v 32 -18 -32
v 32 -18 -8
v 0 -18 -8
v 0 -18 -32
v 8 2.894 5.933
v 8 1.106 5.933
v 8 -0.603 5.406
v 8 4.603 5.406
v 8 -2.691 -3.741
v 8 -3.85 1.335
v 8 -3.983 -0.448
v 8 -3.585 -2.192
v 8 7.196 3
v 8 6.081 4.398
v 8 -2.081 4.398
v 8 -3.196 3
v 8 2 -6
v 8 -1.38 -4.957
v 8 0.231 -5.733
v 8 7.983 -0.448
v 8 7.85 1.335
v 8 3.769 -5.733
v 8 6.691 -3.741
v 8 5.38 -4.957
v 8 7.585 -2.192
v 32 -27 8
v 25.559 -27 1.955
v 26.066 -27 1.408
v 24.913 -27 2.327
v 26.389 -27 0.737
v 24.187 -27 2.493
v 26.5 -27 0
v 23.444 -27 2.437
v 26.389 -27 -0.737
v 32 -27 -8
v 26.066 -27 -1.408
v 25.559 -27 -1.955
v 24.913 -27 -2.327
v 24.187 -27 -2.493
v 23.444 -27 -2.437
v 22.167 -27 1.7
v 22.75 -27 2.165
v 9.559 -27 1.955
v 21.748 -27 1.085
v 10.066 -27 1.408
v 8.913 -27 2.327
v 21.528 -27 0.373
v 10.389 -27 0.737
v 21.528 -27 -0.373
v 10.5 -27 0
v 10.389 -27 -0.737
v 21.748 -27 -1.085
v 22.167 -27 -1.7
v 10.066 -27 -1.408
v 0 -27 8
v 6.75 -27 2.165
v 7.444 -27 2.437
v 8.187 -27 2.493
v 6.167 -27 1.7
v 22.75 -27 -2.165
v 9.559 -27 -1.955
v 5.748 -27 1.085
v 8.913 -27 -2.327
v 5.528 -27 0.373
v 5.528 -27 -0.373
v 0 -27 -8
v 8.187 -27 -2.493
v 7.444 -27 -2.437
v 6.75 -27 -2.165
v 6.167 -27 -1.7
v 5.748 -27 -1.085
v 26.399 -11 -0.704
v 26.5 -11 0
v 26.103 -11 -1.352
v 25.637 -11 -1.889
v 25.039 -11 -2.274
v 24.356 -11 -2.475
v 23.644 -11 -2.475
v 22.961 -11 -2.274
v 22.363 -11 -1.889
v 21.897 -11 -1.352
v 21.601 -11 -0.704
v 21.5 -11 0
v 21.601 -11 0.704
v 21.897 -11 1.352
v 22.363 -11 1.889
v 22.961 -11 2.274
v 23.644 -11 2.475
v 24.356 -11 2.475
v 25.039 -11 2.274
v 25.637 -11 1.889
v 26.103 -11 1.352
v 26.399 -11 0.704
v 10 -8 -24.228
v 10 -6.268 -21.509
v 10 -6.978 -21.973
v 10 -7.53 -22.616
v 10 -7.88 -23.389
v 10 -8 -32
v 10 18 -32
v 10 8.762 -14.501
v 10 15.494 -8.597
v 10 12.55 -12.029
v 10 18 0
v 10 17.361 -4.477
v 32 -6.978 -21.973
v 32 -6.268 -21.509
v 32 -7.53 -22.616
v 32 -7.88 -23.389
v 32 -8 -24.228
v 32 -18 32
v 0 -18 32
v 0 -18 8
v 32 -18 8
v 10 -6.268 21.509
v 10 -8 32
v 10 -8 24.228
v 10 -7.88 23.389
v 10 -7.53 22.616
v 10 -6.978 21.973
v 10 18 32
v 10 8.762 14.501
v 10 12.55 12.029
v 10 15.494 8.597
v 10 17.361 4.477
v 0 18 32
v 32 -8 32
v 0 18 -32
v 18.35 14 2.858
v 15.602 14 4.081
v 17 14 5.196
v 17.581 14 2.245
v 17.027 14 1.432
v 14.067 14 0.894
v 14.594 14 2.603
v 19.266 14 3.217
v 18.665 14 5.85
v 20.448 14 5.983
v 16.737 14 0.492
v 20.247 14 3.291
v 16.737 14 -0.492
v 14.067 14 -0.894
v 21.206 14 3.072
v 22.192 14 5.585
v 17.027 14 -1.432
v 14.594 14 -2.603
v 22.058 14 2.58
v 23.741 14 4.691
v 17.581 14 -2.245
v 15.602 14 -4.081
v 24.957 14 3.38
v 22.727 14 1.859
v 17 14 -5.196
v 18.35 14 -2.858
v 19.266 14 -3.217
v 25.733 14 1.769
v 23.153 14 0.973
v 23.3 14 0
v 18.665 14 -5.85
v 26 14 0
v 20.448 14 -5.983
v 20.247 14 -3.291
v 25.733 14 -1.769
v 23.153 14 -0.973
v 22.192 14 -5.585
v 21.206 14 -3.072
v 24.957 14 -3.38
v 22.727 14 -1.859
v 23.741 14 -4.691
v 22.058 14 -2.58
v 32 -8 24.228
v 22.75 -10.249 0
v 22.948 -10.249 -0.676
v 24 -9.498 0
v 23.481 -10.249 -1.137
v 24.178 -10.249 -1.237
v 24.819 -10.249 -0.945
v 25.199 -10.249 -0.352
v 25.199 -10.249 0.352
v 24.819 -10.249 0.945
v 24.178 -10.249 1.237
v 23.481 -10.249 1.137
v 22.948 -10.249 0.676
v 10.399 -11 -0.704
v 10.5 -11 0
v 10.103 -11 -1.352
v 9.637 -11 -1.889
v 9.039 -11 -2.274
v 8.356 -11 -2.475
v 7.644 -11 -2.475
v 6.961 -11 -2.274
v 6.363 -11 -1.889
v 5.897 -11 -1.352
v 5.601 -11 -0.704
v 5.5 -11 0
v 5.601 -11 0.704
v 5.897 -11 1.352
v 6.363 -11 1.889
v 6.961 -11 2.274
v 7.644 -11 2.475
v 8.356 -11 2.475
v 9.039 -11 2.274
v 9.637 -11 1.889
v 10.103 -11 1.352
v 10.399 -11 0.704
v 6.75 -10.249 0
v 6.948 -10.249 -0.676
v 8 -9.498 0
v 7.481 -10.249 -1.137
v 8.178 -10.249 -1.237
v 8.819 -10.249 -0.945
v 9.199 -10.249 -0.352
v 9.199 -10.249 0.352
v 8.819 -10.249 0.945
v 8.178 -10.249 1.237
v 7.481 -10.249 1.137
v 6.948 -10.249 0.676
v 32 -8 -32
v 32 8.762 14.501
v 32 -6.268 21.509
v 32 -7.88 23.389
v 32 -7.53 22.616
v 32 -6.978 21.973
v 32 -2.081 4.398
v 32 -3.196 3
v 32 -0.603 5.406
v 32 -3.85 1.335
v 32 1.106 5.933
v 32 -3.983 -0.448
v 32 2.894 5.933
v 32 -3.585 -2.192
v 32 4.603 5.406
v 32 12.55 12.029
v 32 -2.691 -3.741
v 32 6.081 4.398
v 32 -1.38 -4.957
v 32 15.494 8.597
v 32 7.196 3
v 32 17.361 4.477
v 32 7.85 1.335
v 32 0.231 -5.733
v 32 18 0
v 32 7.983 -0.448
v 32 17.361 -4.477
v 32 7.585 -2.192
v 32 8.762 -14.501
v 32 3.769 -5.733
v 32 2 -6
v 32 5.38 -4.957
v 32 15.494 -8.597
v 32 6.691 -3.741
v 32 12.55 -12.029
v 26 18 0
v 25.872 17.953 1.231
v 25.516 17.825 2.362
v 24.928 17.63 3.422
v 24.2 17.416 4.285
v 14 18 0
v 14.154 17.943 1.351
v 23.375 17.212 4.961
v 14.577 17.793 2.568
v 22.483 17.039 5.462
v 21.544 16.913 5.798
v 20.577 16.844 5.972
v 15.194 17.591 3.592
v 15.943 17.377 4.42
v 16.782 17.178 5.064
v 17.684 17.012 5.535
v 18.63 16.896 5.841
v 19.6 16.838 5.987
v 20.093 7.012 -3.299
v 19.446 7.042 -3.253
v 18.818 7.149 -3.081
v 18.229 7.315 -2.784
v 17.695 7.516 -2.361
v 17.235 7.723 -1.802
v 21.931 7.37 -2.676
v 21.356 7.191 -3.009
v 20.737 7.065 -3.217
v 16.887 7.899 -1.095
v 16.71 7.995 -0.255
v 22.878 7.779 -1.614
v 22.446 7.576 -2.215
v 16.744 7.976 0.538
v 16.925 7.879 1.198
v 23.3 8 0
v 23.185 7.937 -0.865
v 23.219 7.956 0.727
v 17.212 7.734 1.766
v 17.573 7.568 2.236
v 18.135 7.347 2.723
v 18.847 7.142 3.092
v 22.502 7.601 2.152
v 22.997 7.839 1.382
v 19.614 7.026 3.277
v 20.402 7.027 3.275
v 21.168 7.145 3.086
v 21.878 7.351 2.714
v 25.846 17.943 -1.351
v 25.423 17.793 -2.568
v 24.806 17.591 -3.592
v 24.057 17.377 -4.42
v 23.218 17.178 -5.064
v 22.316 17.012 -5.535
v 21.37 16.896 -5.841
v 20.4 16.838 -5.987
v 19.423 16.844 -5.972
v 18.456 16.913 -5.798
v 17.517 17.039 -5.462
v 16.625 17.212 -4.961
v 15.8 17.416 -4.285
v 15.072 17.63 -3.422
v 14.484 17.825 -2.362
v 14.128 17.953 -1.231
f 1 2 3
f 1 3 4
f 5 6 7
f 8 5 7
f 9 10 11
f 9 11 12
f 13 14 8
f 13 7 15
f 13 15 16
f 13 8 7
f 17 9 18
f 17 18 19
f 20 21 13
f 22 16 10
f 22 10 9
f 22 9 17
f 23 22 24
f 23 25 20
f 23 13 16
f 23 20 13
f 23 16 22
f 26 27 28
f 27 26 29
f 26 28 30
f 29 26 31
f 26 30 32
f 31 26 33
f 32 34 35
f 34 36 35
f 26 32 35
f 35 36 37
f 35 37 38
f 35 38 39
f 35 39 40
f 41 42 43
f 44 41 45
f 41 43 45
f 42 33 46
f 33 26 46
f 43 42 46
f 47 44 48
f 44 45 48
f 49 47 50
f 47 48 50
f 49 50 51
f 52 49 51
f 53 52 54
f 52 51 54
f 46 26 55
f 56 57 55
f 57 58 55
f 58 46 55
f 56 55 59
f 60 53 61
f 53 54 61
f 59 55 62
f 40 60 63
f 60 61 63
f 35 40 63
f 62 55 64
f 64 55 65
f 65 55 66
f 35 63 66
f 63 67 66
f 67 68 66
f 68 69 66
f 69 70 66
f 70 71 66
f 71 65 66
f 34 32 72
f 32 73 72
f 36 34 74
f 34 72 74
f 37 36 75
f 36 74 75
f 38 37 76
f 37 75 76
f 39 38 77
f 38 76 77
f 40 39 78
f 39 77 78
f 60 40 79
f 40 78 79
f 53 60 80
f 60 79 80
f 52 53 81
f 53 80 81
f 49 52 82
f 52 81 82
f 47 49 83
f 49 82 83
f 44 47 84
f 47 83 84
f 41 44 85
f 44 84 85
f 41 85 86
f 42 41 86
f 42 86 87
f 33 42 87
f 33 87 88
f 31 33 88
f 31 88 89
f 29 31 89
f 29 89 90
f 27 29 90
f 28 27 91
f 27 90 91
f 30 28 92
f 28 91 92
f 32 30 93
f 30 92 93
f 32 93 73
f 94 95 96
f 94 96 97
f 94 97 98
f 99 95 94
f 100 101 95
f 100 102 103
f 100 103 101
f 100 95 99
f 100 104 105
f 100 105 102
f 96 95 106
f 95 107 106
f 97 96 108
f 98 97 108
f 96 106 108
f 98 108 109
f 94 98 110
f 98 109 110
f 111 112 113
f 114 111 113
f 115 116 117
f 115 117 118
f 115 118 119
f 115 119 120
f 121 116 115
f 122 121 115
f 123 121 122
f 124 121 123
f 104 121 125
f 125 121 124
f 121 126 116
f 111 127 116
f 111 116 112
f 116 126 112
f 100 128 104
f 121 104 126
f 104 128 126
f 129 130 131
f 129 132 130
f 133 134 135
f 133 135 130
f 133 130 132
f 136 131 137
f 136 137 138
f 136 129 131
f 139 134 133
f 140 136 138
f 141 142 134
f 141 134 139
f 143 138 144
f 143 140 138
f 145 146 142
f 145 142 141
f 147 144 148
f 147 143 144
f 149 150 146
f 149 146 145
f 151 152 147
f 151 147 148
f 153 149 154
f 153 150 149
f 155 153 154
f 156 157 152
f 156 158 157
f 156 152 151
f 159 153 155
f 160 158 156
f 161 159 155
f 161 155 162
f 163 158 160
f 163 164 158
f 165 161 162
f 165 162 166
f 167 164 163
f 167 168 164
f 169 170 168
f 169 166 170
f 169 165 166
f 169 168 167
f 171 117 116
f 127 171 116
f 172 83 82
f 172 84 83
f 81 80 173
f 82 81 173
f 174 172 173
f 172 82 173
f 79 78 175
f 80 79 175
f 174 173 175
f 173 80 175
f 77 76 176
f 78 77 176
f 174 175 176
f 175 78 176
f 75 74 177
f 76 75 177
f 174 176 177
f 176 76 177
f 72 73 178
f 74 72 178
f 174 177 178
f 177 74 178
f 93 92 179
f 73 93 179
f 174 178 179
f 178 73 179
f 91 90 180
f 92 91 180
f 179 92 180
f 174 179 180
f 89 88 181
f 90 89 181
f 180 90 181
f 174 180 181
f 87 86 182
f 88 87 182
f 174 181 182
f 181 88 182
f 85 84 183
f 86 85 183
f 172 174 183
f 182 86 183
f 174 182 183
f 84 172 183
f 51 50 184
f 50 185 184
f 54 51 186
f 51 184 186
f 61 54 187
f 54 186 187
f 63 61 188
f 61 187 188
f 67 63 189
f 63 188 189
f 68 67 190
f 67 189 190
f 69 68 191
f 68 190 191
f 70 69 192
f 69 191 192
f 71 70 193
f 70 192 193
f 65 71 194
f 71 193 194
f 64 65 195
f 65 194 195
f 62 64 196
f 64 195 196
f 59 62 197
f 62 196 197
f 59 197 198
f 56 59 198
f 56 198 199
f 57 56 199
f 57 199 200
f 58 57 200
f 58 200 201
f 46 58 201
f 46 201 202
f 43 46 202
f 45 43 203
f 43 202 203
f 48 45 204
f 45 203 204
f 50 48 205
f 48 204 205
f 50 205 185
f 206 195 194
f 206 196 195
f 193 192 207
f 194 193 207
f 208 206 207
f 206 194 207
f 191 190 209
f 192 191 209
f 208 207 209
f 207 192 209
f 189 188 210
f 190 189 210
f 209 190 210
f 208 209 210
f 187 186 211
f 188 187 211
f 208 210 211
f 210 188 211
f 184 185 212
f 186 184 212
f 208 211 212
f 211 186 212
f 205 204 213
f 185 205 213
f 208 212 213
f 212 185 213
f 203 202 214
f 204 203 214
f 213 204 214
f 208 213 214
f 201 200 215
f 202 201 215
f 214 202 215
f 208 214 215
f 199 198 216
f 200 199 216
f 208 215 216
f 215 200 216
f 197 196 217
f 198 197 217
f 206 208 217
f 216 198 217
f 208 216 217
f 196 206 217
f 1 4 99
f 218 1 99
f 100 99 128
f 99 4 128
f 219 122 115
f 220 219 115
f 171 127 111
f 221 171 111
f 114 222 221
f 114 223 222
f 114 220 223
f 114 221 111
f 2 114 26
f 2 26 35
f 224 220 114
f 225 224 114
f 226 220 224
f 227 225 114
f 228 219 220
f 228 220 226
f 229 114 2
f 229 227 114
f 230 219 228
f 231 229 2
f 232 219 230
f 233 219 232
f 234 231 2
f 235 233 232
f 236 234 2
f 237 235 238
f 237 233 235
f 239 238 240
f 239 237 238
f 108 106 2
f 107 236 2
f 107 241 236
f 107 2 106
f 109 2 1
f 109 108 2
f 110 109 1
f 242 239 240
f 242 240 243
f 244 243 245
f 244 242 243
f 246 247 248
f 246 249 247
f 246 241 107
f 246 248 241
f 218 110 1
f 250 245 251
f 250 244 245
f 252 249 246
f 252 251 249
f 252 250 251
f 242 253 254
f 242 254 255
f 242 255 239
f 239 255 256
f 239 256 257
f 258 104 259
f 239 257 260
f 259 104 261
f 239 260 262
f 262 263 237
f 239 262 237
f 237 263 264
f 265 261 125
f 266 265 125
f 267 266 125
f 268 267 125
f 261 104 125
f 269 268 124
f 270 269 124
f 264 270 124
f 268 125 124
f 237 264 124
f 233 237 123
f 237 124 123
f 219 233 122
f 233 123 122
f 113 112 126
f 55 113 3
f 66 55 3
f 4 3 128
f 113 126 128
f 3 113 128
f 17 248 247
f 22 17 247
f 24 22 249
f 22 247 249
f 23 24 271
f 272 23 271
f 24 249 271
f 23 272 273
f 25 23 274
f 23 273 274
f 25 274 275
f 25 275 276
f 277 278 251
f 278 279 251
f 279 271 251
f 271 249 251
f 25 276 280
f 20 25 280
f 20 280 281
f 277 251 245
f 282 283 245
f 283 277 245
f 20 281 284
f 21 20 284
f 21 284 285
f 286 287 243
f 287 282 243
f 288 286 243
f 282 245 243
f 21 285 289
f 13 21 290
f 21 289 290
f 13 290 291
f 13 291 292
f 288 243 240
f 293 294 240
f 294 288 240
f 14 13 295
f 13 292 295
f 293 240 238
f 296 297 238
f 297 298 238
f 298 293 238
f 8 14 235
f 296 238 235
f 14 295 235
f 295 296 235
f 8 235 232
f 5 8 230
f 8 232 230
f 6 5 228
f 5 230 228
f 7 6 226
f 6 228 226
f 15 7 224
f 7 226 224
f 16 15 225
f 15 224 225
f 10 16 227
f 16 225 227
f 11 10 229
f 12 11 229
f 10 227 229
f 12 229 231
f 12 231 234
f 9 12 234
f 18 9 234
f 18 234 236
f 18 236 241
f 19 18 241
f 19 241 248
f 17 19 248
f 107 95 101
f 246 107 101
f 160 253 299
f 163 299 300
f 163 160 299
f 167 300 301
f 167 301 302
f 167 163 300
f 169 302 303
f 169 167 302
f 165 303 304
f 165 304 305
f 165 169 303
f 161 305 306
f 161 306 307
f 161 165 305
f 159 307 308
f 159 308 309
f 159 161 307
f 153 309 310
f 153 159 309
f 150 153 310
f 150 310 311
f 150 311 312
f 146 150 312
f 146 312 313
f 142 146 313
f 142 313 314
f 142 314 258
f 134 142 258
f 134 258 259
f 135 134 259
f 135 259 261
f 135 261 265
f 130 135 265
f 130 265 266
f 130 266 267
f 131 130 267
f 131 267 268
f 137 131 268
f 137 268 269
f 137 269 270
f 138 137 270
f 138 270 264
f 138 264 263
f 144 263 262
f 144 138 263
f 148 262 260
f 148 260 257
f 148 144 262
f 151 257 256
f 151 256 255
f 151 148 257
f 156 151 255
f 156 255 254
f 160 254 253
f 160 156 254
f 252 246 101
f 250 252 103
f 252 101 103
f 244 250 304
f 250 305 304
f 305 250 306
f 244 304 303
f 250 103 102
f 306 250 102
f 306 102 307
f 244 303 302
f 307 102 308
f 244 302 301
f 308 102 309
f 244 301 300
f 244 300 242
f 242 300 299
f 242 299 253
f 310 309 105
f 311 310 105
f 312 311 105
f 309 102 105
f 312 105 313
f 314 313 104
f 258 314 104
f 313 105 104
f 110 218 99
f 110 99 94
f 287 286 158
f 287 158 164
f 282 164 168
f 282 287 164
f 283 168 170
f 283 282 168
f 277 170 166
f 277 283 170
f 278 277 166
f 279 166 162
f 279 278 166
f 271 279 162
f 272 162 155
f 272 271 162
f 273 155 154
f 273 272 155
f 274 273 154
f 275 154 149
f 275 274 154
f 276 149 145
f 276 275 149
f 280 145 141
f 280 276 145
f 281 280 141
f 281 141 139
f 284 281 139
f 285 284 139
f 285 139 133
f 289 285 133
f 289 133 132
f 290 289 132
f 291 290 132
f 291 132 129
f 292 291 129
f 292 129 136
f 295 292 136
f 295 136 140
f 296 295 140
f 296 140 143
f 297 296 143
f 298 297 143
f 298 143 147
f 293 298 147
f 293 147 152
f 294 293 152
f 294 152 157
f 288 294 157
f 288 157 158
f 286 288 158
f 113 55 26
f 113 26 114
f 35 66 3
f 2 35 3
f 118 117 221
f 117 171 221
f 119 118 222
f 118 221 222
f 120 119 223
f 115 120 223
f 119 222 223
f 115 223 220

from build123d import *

# Parameters (mm, degrees)
SKETCH1_W                               = 16
SKETCH1_H                               = 9
SKETCH1_R                               = 6
BOSS_EXTRUDE1_DEPTH                     = 32
BOSS_EXTRUDE2_DEPTH                     = 10
CUT_EXTRUDE1_START                      = 32
SKETCH1_4_R                             = 6
CUT_EXTRUDE1_DEPTH                      = 24
FILLET1_R                               = 3
CBORE_START                             = 14
CBORE_FOR_M6_HEX_HEAD_BOLT1_OUTLINE_R   = 6
CBORE_FOR_M6_HEX_HEAD_BOLT1_DEPTH       = 4
CBORE_START_2                           = 7.010987826
CBORE_FOR_M6_HEX_HEAD_BOLT1_2_OUTLINE_R = 3.3
CBORE_FOR_M6_HEX_HEAD_BOLT1_2_DEPTH     = 6.989012174
M6X1_0_TAPPED_HOLE1_D                   = 5
M6X1_0_TAPPED_HOLE1_DEPTH               = 16
M6X1_0_TAPPED_HOLE1_TIP                 = 1.502151548


# Read off the part's stored shape, not the designer's step: CBORE for M6 Hex Head Bolt1
with BuildPart() as part:
    # Sketch1 → Boss-Extrude1 (new body)
    # profile 1 of 4: a face of its own
    with BuildSketch(Plane(origin=(0, 0, 0), x_dir=(0, 0, -1), z_dir=(1, 0, 0))):
        Polygon((-22.317123285, -8), (-32, -8), (-32, -18), (-8, -18), (8, -18), (32, -18), (32, -8), (22.317123285, -8), align=None)
    # profile 2 of 4: a face of its own
    with BuildSketch(Plane(origin=(0, 0, 0), x_dir=(0, 0, -1), z_dir=(1, 0, 0))):
        with Locations((0, -22.5)):
            Rectangle(SKETCH1_W, SKETCH1_H)
    # profile 3 of 4: a face of its own
    with BuildSketch(Plane(origin=(0, 0, 0), x_dir=(0, 0, -1), z_dir=(1, 0, 0))):
        with BuildLine():
            Line((-14.500924593, 8.761892188), (-22.317123285, -8))
            Line((-22.317123285, -8), (22.317123285, -8))
            Line((22.317123285, -8), (14.500924593, 8.761892188))
            ThreePointArc((14.500924593, 8.761892188), (8.596793684, 15.494263165), (-1.18e-07, 18))
            ThreePointArc((-1.18e-07, 18), (-8.596793783, 15.494263101), (-14.500924593, 8.761892188))
        make_face()
        with Locations((0, 2)):
            Circle(SKETCH1_R, mode=Mode.SUBTRACT)
    # profile 4 of 4: a face of its own
    with BuildSketch(Plane(origin=(0, 0, 0), x_dir=(0, 0, -1), z_dir=(1, 0, 0))):
        with Locations((0, 2)):
            Circle(SKETCH1_R)
    extrude(amount=BOSS_EXTRUDE1_DEPTH)

    # Sketch1<3> → Boss-Extrude2 (add)
    with BuildSketch(Plane(origin=(0, 0, 0), x_dir=(0, 0, -1), z_dir=(1, 0, 0))):
        with BuildLine():
            Line((-32, 18), (-32, -8))
            Line((-32, -8), (-22.317123285, -8))
            Line((-22.317123285, -8), (-14.500924593, 8.761892188))
            ThreePointArc((-14.500924593, 8.761892188), (-8.596793783, 15.494263101), (-1.18e-07, 18))
            Line((-1.18e-07, 18), (-32, 18))
        make_face()
        with BuildLine():
            Line((14.500924593, 8.761892188), (22.317123285, -8))
            Line((22.317123285, -8), (32, -8))
            Line((32, -8), (32, 18))
            Line((32, 18), (-1.18e-07, 18))
            ThreePointArc((-1.18e-07, 18), (8.596793684, 15.494263165), (14.500924593, 8.761892188))
        make_face()
    extrude(amount=BOSS_EXTRUDE2_DEPTH)

    # Sketch1<4> → Cut-Extrude1 (cut)
    with BuildSketch(Plane(origin=(0, 0, 0), x_dir=(0, 0, -1), z_dir=(1, 0, 0)).offset(CUT_EXTRUDE1_START)):
        with Locations((0, 2)):
            Circle(SKETCH1_4_R)
    extrude(amount=-CUT_EXTRUDE1_DEPTH, mode=Mode.SUBTRACT)

    # Fillet1
    fillet1_edges = [part.edges().sort_by_distance(p)[0] for p in [
        (21, -8, 22.317123285),
        (21, -8, -22.317123285),
    ]]
    fillet(fillet1_edges, radius=FILLET1_R)

    # CBORE for M6 Hex Head Bolt1 outline → CBORE for M6 Hex Head Bolt1 (cut)
    with BuildSketch(Plane(origin=(0, 0, 0), x_dir=(1, 0, 0), z_dir=(0, 1, 0)).offset(CBORE_START)):
        with Locations((20, 0)):
            Circle(CBORE_FOR_M6_HEX_HEAD_BOLT1_OUTLINE_R)
    extrude(amount=CBORE_FOR_M6_HEX_HEAD_BOLT1_DEPTH, mode=Mode.SUBTRACT)

    # CBORE for M6 Hex Head Bolt1 2 outline → CBORE for M6 Hex Head Bolt1 2 (cut)
    with BuildSketch(Plane(origin=(0, 0, 0), x_dir=(1, 0, 0), z_dir=(0, 1, 0)).offset(CBORE_START_2)):
        with Locations((20, 0)):
            Circle(CBORE_FOR_M6_HEX_HEAD_BOLT1_2_OUTLINE_R)
    extrude(amount=CBORE_FOR_M6_HEX_HEAD_BOLT1_2_DEPTH, mode=Mode.SUBTRACT)

    # M6x1.0 Tapped Hole1
    with Locations(Plane(origin=(0, -27, 0), x_dir=(-1, 0, 0), z_dir=(0, -1, 0))):
        with Locations((-24, 0), (-8, 0)):
            Hole(M6X1_0_TAPPED_HOLE1_D / 2, depth=M6X1_0_TAPPED_HOLE1_DEPTH)
            with Locations((0, 0, -(M6X1_0_TAPPED_HOLE1_DEPTH + M6X1_0_TAPPED_HOLE1_TIP / 2))):  # 118° drill point
                Cone(0, M6X1_0_TAPPED_HOLE1_D / 2, M6X1_0_TAPPED_HOLE1_TIP, mode=Mode.SUBTRACT)


solid = part.part
